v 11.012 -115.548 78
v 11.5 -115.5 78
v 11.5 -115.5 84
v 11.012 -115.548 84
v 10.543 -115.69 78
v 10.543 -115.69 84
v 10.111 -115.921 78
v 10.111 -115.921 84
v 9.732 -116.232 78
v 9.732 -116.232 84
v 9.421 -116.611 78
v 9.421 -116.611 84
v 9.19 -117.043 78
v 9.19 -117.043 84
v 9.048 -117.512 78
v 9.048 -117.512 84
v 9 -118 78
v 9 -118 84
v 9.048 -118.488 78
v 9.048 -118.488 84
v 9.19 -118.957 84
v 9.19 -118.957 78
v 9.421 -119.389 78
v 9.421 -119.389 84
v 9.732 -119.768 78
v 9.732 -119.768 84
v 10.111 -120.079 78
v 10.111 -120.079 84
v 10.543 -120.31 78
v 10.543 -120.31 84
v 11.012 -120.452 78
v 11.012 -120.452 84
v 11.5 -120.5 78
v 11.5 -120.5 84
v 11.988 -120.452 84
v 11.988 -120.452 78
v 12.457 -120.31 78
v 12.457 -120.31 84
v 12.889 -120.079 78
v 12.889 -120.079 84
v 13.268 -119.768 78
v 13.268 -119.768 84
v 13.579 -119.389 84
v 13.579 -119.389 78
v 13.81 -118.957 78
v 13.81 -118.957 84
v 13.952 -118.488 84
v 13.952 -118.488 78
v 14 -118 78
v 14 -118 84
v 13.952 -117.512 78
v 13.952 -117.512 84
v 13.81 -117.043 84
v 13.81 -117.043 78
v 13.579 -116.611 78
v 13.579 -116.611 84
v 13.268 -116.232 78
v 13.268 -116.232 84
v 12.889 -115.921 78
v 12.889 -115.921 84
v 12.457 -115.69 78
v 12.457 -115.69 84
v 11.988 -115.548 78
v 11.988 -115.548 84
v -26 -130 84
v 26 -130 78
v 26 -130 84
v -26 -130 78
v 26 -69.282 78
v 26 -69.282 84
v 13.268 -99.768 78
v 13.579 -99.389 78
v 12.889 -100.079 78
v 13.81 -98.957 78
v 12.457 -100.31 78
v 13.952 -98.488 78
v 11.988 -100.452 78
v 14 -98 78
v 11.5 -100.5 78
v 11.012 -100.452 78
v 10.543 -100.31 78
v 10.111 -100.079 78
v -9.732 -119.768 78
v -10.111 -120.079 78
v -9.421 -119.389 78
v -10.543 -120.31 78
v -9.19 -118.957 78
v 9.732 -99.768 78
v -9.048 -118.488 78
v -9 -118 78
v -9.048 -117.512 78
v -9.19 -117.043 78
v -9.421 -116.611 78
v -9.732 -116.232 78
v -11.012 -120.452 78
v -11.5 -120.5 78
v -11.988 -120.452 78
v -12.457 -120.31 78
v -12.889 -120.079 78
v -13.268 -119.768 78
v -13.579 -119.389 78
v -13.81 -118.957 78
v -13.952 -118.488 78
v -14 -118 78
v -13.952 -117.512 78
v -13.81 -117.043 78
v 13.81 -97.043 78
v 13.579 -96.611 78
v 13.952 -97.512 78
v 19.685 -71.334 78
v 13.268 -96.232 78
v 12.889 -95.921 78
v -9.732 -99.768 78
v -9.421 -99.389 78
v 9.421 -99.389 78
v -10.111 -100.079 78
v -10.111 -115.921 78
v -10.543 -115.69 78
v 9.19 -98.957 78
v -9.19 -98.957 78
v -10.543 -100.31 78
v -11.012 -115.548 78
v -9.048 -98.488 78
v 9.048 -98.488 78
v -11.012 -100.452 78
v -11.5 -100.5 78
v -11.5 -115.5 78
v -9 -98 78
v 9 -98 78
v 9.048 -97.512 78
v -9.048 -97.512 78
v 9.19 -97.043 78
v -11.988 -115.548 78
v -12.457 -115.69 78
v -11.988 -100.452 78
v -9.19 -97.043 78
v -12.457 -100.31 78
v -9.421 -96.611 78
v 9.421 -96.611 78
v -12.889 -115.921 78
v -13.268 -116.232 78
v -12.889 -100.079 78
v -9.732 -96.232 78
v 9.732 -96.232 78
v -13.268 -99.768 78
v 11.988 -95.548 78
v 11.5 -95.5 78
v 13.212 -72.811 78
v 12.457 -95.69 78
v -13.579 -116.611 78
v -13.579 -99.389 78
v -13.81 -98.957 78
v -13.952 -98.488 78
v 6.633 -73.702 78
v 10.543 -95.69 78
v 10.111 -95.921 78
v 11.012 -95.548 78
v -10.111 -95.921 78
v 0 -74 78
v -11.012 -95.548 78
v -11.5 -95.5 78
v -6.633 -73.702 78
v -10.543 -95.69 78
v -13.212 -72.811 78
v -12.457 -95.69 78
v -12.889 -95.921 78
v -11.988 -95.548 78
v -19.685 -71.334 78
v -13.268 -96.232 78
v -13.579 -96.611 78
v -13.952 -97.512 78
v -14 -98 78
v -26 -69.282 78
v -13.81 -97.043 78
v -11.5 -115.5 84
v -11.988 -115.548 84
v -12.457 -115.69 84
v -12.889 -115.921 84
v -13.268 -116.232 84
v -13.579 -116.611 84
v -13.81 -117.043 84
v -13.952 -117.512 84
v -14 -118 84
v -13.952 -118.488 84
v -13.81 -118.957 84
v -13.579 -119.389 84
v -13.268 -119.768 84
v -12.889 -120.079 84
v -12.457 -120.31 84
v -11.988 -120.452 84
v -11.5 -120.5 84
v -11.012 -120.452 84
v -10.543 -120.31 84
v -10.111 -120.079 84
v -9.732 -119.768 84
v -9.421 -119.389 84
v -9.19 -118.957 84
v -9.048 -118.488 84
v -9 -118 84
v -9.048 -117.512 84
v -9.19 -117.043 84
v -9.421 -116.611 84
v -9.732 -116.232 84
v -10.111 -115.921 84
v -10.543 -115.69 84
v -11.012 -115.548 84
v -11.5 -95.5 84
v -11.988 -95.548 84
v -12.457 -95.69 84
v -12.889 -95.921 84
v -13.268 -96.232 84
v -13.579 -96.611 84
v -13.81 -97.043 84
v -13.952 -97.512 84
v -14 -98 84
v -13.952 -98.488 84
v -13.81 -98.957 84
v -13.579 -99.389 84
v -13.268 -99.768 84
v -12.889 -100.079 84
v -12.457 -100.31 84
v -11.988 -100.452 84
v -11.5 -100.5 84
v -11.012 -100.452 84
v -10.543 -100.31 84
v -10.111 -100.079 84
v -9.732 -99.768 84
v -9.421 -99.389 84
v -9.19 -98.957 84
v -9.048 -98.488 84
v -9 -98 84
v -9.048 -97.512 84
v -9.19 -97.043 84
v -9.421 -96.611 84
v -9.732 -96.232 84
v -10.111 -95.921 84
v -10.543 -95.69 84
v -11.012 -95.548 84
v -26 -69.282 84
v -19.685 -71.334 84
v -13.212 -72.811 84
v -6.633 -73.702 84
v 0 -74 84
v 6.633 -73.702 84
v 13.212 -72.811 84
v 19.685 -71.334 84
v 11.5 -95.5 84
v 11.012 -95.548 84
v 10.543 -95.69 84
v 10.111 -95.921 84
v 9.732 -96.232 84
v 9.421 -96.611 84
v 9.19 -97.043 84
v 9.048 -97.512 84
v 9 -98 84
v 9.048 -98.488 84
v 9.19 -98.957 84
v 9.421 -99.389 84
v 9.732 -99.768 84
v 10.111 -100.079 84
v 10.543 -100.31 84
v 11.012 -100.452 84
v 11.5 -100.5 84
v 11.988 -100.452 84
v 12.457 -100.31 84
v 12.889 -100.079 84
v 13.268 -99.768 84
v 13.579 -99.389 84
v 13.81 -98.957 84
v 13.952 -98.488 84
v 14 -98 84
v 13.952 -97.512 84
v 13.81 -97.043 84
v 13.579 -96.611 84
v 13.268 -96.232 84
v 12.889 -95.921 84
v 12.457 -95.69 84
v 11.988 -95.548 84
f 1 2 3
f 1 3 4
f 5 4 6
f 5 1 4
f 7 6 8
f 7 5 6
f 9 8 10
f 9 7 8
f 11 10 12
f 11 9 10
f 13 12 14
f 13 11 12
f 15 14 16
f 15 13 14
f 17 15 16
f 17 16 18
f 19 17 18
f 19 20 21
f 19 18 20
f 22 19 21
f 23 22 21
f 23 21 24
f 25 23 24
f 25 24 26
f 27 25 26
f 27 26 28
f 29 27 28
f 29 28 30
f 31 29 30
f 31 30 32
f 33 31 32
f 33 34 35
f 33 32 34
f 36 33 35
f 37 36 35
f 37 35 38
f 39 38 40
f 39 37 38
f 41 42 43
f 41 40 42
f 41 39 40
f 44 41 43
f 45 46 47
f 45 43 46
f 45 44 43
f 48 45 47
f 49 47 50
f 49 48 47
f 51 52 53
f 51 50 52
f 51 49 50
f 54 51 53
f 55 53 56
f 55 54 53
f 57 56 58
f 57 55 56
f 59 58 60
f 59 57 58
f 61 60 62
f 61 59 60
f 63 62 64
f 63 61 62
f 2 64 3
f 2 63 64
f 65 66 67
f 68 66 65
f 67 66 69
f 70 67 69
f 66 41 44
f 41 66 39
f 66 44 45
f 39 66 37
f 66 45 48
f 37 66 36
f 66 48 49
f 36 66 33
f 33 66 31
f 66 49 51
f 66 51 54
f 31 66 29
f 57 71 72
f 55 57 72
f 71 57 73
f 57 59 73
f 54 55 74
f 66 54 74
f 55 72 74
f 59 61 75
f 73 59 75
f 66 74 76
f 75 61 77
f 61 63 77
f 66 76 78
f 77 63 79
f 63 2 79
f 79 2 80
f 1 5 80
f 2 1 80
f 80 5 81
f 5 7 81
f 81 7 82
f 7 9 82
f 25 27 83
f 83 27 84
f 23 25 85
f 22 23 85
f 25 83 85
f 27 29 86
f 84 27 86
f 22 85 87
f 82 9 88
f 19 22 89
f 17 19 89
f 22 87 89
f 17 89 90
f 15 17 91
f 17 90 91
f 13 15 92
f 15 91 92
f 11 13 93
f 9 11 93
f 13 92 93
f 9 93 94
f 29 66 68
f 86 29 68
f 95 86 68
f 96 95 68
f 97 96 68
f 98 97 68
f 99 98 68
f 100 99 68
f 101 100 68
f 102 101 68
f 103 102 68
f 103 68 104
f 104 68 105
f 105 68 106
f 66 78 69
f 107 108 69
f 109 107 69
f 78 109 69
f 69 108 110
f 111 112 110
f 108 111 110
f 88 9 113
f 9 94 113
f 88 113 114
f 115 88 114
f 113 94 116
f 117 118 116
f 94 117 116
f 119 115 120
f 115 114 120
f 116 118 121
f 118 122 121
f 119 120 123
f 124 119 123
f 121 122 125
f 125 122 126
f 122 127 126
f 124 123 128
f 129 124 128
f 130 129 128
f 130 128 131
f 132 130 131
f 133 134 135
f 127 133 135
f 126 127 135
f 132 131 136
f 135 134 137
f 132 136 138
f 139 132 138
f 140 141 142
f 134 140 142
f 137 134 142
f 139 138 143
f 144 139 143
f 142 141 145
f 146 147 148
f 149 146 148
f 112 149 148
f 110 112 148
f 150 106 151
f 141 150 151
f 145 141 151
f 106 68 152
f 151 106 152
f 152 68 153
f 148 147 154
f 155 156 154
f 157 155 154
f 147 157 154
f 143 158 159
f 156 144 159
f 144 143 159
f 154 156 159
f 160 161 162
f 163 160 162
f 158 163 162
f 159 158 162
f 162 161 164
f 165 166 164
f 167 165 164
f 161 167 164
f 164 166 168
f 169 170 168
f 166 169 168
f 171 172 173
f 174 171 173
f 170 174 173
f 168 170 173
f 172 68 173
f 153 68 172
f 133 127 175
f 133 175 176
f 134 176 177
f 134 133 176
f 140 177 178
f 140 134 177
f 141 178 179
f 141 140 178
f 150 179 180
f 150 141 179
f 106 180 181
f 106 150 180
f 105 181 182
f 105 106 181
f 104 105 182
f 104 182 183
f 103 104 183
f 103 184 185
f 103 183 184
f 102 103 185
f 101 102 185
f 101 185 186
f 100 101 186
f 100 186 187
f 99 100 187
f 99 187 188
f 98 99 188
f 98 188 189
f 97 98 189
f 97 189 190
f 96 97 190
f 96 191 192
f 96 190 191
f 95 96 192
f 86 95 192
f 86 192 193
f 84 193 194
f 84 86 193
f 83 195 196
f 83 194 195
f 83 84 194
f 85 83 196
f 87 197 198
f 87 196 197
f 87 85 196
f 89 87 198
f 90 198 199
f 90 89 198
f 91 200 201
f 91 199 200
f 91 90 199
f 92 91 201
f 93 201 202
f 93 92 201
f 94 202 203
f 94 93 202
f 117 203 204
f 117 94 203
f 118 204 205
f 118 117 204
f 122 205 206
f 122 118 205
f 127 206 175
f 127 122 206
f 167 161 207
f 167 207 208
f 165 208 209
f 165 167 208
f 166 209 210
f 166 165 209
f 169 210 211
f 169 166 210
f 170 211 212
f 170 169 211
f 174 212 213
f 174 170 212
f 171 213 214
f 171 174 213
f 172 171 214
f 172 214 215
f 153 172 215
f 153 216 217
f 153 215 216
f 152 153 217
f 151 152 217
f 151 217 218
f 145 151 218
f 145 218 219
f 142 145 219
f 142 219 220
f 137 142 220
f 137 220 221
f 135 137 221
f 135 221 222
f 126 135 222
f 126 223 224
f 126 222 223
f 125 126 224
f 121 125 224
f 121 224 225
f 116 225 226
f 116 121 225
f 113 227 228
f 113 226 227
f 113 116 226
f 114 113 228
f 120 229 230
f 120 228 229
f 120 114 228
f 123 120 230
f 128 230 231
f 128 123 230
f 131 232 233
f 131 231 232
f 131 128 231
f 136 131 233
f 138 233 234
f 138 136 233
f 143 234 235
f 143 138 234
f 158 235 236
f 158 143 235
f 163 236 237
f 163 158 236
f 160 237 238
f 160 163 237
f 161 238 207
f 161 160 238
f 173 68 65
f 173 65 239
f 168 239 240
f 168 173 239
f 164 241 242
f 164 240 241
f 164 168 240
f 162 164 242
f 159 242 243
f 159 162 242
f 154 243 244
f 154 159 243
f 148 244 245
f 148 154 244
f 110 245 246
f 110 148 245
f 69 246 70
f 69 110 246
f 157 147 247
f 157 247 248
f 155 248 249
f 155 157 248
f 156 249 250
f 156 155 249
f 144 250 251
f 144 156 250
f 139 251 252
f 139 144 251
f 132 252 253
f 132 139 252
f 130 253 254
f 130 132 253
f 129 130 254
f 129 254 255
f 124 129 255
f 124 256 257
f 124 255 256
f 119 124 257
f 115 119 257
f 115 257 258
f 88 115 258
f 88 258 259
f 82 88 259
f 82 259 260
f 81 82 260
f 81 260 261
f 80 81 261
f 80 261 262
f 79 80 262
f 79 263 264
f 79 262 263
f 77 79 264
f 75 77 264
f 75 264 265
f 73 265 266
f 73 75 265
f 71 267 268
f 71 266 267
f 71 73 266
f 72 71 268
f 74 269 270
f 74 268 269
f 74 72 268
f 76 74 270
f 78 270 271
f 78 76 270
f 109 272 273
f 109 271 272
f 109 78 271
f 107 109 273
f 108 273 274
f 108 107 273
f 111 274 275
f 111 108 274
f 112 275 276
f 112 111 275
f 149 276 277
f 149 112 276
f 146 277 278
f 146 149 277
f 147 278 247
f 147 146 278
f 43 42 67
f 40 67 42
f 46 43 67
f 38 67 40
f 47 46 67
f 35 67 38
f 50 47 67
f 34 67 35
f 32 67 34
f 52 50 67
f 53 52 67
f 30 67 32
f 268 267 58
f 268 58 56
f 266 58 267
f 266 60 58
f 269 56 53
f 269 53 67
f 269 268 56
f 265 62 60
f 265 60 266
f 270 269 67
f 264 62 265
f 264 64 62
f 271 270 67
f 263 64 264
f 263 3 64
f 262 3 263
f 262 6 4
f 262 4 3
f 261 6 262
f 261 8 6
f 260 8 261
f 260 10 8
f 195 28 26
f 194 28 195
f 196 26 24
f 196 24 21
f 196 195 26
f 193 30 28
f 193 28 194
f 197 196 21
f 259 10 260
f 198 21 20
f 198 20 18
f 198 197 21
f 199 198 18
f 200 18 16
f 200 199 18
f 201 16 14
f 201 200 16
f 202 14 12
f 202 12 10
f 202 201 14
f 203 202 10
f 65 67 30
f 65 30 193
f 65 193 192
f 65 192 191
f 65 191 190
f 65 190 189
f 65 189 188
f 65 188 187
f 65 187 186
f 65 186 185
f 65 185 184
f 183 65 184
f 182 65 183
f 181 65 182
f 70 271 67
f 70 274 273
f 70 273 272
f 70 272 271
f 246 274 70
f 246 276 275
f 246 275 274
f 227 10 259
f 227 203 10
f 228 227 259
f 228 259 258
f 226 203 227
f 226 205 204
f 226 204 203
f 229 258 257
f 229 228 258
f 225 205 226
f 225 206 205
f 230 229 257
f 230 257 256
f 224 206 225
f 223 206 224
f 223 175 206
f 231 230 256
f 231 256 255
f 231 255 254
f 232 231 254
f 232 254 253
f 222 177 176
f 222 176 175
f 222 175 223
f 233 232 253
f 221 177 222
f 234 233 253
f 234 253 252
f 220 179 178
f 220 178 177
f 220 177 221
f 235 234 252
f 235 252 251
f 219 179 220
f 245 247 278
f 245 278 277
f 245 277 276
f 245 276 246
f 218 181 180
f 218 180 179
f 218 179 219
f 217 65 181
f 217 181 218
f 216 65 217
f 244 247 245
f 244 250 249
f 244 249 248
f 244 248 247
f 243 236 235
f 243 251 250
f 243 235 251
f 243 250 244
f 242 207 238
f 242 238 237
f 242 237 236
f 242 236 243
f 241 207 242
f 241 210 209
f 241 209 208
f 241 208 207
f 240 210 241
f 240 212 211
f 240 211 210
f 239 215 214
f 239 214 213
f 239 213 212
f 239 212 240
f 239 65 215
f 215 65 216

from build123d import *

# Parameters (mm, degrees)
CYLINDER1840_R              = 74
CYLINDER1840_DEPTH          = 64
CYLINDER1831_R              = 2.5
CYLINDER1831_DEPTH          = 20
CYLINDER1830_R              = 2.5
CYLINDER1830_DEPTH          = 20
COMPOUND931_PLACEMENT_ANGLE = 90
CYLINDER1828_R              = 2.5
CYLINDER1828_DEPTH          = 20
CYLINDER1829_R              = 2.5
CYLINDER1829_DEPTH          = 20
COMPOUND930_PLACEMENT_ANGLE = 90
BOX785_W                    = 72
BOX785_H                    = 52
BOX785_DEPTH                = 6


with BuildPart() as v_lec1840:
    # Cylinder1840 → Cylinder1840 (new body)
    with BuildSketch(Plane.XY.offset(25)):
        Circle(CYLINDER1840_R)
    extrude(amount=CYLINDER1840_DEPTH)


with BuildPart() as v_lec1831:
    # Cylinder1831 → Cylinder1831 (new body)
    with BuildSketch(Plane(origin=(-90, -10, 66), x_dir=(1, 0, 0), z_dir=(0, 0, 1))):
        Circle(CYLINDER1831_R)
    extrude(amount=CYLINDER1831_DEPTH)


with BuildPart() as compound931:
    # Cylinder1830 → Cylinder1830 (new body)
    with BuildSketch(Plane(origin=(-110, -10, 66), x_dir=(1, 0, 0), z_dir=(0, 0, 1))):
        Circle(CYLINDER1830_R)
    extrude(amount=CYLINDER1830_DEPTH)

    # Compound931: union Válec1831
    add(v_lec1831.part)


with BuildPart() as compound931_1:
    # Compound931 placement: moved
    add(compound931.part.moved(Location((-21.5, -8, 0))).rotate(Axis((-21.5, -8, 0), (0, 0, 1)), COMPOUND931_PLACEMENT_ANGLE))


with BuildPart() as v_lec1828:
    # Cylinder1828 → Cylinder1828 (new body)
    with BuildSketch(Plane(origin=(-90, -10, 66), x_dir=(1, 0, 0), z_dir=(0, 0, 1))):
        Circle(CYLINDER1828_R)
    extrude(amount=CYLINDER1828_DEPTH)


with BuildPart() as compound932:
    # Cylinder1829 → Cylinder1829 (new body)
    with BuildSketch(Plane(origin=(-110, -10, 66), x_dir=(1, 0, 0), z_dir=(0, 0, 1))):
        Circle(CYLINDER1829_R)
    extrude(amount=CYLINDER1829_DEPTH)

    # Compound930: union Válec1828
    add(v_lec1828.part)


with BuildPart() as compound932_1:
    # Compound930 placement: moved
    add(compound932.part.moved(Location((1.5, -8, 0))).rotate(Axis((1.5, -8, 0), (0, 0, 1)), COMPOUND930_PLACEMENT_ANGLE))

    # Compound932: union Compound931
    add(compound931_1.part)


with BuildPart() as cut597:
    # Box785 → Box785 (new body)
    with BuildSketch(Plane(origin=(26, -130, 78), x_dir=(0, 1, 0), z_dir=(0, 0, 1))):
        with Locations((36, 26)):
            Rectangle(BOX785_W, BOX785_H)
    extrude(amount=BOX785_DEPTH)

    # Cut594: cut Compound932
    add(compound932_1.part, mode=Mode.SUBTRACT)

    # Cut597: cut Válec1840
    add(v_lec1840.part, mode=Mode.SUBTRACT)


solid = cut597.part
